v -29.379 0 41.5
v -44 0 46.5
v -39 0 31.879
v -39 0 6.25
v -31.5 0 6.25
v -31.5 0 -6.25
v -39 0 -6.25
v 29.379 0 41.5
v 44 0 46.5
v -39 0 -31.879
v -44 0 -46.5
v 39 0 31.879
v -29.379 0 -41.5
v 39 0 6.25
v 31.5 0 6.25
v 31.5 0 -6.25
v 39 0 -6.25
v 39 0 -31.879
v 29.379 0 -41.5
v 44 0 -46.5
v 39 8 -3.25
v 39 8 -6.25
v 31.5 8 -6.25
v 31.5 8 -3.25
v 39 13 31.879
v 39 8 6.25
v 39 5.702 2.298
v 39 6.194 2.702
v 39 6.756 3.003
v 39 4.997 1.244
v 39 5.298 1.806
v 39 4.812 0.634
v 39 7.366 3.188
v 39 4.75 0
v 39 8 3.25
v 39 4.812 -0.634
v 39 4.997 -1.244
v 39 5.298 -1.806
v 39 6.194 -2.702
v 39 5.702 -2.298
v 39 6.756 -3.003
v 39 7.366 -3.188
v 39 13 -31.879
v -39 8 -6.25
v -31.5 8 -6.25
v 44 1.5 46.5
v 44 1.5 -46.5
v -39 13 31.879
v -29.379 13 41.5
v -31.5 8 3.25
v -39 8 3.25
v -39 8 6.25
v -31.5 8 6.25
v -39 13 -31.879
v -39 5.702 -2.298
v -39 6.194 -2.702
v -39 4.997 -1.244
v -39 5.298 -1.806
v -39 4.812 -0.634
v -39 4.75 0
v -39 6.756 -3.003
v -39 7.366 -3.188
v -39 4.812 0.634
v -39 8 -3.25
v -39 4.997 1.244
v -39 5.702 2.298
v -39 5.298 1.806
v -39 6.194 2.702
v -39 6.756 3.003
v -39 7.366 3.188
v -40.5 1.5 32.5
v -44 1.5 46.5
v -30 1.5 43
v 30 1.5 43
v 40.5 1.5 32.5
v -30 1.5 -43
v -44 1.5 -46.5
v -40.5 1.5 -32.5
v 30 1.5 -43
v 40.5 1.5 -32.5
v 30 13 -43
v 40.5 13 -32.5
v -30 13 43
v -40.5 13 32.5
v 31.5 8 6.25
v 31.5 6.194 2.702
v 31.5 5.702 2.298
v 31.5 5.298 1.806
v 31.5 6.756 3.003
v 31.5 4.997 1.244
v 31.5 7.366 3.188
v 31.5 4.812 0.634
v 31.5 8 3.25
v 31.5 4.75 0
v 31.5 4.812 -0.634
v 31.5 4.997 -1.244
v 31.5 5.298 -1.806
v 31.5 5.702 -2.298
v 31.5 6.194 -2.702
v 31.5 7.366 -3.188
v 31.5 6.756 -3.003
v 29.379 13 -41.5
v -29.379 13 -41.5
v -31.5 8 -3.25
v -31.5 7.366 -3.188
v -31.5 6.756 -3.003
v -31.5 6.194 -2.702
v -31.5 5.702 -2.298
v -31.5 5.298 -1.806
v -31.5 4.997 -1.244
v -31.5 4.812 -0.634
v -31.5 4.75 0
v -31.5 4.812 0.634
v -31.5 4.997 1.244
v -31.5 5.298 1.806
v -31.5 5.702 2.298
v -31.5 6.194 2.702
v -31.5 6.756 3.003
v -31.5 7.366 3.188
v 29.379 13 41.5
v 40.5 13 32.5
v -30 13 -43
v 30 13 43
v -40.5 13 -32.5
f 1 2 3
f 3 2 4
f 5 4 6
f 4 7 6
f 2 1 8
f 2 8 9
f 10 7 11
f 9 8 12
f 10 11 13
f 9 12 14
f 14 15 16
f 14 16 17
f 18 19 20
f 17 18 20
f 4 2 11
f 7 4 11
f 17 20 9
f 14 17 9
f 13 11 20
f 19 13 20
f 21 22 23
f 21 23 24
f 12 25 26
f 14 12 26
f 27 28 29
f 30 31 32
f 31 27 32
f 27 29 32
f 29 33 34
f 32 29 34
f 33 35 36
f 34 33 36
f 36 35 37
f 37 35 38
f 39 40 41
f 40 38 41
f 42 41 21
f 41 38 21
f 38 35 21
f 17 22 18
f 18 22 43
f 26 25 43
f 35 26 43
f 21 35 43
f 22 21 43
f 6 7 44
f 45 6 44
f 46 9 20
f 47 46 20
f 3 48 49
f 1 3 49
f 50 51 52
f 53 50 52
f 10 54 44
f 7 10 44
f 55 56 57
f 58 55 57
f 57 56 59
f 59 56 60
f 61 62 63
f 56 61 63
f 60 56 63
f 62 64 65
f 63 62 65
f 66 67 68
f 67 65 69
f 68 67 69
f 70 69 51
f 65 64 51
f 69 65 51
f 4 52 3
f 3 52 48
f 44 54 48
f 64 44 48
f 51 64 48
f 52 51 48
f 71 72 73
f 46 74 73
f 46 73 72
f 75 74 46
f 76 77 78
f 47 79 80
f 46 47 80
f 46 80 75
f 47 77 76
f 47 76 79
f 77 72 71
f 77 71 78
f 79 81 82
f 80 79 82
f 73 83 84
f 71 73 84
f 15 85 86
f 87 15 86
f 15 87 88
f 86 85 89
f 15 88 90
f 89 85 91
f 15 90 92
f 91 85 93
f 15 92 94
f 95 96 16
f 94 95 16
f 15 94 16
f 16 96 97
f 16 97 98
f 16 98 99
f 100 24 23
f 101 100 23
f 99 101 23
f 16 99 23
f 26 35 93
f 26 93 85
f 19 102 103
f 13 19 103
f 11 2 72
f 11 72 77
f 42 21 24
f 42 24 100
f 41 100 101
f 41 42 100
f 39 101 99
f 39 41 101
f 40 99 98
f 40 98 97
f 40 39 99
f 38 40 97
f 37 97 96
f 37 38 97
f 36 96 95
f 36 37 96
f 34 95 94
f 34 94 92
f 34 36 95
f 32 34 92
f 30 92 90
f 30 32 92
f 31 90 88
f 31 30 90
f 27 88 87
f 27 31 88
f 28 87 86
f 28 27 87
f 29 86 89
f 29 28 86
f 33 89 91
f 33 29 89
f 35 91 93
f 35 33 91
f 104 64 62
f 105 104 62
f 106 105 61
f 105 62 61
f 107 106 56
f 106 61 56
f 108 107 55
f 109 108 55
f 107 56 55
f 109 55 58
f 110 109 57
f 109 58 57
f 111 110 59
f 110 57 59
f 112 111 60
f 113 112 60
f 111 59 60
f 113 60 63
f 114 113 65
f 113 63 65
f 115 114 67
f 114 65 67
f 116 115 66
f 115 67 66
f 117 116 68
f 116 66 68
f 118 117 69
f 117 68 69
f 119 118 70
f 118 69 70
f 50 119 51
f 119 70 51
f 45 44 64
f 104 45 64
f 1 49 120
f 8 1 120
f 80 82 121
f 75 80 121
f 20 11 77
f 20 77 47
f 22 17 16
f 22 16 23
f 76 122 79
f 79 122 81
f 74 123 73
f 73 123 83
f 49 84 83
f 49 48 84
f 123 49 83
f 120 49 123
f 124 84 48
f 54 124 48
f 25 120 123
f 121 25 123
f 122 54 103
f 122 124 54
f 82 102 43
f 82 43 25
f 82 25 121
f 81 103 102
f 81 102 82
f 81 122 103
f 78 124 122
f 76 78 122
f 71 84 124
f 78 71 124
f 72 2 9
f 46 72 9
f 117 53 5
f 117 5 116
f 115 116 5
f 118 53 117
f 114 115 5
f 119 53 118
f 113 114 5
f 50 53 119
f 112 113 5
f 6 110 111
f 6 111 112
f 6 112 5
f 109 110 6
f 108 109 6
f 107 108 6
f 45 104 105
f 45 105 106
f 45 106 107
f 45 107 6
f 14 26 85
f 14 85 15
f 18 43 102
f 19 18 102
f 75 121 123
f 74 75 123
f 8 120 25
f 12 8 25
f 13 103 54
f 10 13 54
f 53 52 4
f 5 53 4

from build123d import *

# Parameters (mm, degrees)
SKETCH1_W           = 88
SKETCH1_H           = 93
BOSS_EXTRUDE1_DEPTH = 13
CUT_EXTRUDE1_DEPTH  = 11.5
CUT_EXTRUDE2_DEPTH  = 66.324191537
BOSS_EXTRUDE2_DEPTH = 7.5


with BuildPart() as part:
    # Sketch1 → Boss-Extrude1 (new body)
    with BuildSketch(Plane(origin=(0, 0, 0), x_dir=(1, 0, 0), z_dir=(0, 1, 0))):
        Rectangle(SKETCH1_W, SKETCH1_H)
    extrude(amount=BOSS_EXTRUDE1_DEPTH)

    # Sketch2 → Cut-Extrude1 (cut)
    with BuildSketch(Plane(origin=(0, 13, 0), x_dir=(1, 0, 0), z_dir=(0, 1, 0))):
        Polygon((-44, -36.5), (-44, -46.5), (-34, -46.5), (34, -46.5), (44, -46.5), (44, -36.5), (44, 36.5), (44, 46.5), (34, 46.5), (-34, 46.5), (-44, 46.5), (-44, 36.5), align=None)
        Polygon((-30, -43), (-40.5, -32.5), (-40.5, 32.5), (-30, 43), (30, 43), (40.5, 32.5), (40.5, -32.5), (30, -43), align=None, mode=Mode.SUBTRACT)
    extrude(amount=-CUT_EXTRUDE1_DEPTH, mode=Mode.SUBTRACT)

    # Sketch3 → Cut-Extrude2 (cut, through all)
    with BuildSketch(Plane(origin=(0, 13, 0), x_dir=(1, 0, 0), z_dir=(0, 1, 0))):
        Polygon((-29.378679656, -41.5), (29.378679656, -41.5), (39, -31.878679656), (39, 31.878679656), (29.378679656, 41.5), (-29.378679656, 41.5), (-39, 31.878679656), (-39, -31.878679656), align=None)
    extrude(amount=-CUT_EXTRUDE2_DEPTH, mode=Mode.SUBTRACT)

    # Sketch5 → Boss-Extrude2 (add)
    with BuildSketch(Plane(origin=(-39, 0, 0), x_dir=(0, 0, -1), z_dir=(1, 0, 0))):
        with BuildLine():
            Line((-6.25, 0), (6.25, 0))
            Line((6.25, 0), (6.25, 8))
            Line((6.25, 8), (3.25, 8))
            ThreePointArc((3.25, 8), (0, 4.75), (-3.25, 8))
            Line((-3.25, 8), (-6.25, 8))
            Line((-6.25, 8), (-6.25, 0))
        make_face()
    boss_extrude2 = extrude(amount=BOSS_EXTRUDE2_DEPTH)

    # Mirror1: Boss-Extrude2 across plane
    add(boss_extrude2.mirror(Plane(origin=(0, 0, 0), x_dir=(0, 0, 1), z_dir=(1, 0, 0))))


solid = part.part
